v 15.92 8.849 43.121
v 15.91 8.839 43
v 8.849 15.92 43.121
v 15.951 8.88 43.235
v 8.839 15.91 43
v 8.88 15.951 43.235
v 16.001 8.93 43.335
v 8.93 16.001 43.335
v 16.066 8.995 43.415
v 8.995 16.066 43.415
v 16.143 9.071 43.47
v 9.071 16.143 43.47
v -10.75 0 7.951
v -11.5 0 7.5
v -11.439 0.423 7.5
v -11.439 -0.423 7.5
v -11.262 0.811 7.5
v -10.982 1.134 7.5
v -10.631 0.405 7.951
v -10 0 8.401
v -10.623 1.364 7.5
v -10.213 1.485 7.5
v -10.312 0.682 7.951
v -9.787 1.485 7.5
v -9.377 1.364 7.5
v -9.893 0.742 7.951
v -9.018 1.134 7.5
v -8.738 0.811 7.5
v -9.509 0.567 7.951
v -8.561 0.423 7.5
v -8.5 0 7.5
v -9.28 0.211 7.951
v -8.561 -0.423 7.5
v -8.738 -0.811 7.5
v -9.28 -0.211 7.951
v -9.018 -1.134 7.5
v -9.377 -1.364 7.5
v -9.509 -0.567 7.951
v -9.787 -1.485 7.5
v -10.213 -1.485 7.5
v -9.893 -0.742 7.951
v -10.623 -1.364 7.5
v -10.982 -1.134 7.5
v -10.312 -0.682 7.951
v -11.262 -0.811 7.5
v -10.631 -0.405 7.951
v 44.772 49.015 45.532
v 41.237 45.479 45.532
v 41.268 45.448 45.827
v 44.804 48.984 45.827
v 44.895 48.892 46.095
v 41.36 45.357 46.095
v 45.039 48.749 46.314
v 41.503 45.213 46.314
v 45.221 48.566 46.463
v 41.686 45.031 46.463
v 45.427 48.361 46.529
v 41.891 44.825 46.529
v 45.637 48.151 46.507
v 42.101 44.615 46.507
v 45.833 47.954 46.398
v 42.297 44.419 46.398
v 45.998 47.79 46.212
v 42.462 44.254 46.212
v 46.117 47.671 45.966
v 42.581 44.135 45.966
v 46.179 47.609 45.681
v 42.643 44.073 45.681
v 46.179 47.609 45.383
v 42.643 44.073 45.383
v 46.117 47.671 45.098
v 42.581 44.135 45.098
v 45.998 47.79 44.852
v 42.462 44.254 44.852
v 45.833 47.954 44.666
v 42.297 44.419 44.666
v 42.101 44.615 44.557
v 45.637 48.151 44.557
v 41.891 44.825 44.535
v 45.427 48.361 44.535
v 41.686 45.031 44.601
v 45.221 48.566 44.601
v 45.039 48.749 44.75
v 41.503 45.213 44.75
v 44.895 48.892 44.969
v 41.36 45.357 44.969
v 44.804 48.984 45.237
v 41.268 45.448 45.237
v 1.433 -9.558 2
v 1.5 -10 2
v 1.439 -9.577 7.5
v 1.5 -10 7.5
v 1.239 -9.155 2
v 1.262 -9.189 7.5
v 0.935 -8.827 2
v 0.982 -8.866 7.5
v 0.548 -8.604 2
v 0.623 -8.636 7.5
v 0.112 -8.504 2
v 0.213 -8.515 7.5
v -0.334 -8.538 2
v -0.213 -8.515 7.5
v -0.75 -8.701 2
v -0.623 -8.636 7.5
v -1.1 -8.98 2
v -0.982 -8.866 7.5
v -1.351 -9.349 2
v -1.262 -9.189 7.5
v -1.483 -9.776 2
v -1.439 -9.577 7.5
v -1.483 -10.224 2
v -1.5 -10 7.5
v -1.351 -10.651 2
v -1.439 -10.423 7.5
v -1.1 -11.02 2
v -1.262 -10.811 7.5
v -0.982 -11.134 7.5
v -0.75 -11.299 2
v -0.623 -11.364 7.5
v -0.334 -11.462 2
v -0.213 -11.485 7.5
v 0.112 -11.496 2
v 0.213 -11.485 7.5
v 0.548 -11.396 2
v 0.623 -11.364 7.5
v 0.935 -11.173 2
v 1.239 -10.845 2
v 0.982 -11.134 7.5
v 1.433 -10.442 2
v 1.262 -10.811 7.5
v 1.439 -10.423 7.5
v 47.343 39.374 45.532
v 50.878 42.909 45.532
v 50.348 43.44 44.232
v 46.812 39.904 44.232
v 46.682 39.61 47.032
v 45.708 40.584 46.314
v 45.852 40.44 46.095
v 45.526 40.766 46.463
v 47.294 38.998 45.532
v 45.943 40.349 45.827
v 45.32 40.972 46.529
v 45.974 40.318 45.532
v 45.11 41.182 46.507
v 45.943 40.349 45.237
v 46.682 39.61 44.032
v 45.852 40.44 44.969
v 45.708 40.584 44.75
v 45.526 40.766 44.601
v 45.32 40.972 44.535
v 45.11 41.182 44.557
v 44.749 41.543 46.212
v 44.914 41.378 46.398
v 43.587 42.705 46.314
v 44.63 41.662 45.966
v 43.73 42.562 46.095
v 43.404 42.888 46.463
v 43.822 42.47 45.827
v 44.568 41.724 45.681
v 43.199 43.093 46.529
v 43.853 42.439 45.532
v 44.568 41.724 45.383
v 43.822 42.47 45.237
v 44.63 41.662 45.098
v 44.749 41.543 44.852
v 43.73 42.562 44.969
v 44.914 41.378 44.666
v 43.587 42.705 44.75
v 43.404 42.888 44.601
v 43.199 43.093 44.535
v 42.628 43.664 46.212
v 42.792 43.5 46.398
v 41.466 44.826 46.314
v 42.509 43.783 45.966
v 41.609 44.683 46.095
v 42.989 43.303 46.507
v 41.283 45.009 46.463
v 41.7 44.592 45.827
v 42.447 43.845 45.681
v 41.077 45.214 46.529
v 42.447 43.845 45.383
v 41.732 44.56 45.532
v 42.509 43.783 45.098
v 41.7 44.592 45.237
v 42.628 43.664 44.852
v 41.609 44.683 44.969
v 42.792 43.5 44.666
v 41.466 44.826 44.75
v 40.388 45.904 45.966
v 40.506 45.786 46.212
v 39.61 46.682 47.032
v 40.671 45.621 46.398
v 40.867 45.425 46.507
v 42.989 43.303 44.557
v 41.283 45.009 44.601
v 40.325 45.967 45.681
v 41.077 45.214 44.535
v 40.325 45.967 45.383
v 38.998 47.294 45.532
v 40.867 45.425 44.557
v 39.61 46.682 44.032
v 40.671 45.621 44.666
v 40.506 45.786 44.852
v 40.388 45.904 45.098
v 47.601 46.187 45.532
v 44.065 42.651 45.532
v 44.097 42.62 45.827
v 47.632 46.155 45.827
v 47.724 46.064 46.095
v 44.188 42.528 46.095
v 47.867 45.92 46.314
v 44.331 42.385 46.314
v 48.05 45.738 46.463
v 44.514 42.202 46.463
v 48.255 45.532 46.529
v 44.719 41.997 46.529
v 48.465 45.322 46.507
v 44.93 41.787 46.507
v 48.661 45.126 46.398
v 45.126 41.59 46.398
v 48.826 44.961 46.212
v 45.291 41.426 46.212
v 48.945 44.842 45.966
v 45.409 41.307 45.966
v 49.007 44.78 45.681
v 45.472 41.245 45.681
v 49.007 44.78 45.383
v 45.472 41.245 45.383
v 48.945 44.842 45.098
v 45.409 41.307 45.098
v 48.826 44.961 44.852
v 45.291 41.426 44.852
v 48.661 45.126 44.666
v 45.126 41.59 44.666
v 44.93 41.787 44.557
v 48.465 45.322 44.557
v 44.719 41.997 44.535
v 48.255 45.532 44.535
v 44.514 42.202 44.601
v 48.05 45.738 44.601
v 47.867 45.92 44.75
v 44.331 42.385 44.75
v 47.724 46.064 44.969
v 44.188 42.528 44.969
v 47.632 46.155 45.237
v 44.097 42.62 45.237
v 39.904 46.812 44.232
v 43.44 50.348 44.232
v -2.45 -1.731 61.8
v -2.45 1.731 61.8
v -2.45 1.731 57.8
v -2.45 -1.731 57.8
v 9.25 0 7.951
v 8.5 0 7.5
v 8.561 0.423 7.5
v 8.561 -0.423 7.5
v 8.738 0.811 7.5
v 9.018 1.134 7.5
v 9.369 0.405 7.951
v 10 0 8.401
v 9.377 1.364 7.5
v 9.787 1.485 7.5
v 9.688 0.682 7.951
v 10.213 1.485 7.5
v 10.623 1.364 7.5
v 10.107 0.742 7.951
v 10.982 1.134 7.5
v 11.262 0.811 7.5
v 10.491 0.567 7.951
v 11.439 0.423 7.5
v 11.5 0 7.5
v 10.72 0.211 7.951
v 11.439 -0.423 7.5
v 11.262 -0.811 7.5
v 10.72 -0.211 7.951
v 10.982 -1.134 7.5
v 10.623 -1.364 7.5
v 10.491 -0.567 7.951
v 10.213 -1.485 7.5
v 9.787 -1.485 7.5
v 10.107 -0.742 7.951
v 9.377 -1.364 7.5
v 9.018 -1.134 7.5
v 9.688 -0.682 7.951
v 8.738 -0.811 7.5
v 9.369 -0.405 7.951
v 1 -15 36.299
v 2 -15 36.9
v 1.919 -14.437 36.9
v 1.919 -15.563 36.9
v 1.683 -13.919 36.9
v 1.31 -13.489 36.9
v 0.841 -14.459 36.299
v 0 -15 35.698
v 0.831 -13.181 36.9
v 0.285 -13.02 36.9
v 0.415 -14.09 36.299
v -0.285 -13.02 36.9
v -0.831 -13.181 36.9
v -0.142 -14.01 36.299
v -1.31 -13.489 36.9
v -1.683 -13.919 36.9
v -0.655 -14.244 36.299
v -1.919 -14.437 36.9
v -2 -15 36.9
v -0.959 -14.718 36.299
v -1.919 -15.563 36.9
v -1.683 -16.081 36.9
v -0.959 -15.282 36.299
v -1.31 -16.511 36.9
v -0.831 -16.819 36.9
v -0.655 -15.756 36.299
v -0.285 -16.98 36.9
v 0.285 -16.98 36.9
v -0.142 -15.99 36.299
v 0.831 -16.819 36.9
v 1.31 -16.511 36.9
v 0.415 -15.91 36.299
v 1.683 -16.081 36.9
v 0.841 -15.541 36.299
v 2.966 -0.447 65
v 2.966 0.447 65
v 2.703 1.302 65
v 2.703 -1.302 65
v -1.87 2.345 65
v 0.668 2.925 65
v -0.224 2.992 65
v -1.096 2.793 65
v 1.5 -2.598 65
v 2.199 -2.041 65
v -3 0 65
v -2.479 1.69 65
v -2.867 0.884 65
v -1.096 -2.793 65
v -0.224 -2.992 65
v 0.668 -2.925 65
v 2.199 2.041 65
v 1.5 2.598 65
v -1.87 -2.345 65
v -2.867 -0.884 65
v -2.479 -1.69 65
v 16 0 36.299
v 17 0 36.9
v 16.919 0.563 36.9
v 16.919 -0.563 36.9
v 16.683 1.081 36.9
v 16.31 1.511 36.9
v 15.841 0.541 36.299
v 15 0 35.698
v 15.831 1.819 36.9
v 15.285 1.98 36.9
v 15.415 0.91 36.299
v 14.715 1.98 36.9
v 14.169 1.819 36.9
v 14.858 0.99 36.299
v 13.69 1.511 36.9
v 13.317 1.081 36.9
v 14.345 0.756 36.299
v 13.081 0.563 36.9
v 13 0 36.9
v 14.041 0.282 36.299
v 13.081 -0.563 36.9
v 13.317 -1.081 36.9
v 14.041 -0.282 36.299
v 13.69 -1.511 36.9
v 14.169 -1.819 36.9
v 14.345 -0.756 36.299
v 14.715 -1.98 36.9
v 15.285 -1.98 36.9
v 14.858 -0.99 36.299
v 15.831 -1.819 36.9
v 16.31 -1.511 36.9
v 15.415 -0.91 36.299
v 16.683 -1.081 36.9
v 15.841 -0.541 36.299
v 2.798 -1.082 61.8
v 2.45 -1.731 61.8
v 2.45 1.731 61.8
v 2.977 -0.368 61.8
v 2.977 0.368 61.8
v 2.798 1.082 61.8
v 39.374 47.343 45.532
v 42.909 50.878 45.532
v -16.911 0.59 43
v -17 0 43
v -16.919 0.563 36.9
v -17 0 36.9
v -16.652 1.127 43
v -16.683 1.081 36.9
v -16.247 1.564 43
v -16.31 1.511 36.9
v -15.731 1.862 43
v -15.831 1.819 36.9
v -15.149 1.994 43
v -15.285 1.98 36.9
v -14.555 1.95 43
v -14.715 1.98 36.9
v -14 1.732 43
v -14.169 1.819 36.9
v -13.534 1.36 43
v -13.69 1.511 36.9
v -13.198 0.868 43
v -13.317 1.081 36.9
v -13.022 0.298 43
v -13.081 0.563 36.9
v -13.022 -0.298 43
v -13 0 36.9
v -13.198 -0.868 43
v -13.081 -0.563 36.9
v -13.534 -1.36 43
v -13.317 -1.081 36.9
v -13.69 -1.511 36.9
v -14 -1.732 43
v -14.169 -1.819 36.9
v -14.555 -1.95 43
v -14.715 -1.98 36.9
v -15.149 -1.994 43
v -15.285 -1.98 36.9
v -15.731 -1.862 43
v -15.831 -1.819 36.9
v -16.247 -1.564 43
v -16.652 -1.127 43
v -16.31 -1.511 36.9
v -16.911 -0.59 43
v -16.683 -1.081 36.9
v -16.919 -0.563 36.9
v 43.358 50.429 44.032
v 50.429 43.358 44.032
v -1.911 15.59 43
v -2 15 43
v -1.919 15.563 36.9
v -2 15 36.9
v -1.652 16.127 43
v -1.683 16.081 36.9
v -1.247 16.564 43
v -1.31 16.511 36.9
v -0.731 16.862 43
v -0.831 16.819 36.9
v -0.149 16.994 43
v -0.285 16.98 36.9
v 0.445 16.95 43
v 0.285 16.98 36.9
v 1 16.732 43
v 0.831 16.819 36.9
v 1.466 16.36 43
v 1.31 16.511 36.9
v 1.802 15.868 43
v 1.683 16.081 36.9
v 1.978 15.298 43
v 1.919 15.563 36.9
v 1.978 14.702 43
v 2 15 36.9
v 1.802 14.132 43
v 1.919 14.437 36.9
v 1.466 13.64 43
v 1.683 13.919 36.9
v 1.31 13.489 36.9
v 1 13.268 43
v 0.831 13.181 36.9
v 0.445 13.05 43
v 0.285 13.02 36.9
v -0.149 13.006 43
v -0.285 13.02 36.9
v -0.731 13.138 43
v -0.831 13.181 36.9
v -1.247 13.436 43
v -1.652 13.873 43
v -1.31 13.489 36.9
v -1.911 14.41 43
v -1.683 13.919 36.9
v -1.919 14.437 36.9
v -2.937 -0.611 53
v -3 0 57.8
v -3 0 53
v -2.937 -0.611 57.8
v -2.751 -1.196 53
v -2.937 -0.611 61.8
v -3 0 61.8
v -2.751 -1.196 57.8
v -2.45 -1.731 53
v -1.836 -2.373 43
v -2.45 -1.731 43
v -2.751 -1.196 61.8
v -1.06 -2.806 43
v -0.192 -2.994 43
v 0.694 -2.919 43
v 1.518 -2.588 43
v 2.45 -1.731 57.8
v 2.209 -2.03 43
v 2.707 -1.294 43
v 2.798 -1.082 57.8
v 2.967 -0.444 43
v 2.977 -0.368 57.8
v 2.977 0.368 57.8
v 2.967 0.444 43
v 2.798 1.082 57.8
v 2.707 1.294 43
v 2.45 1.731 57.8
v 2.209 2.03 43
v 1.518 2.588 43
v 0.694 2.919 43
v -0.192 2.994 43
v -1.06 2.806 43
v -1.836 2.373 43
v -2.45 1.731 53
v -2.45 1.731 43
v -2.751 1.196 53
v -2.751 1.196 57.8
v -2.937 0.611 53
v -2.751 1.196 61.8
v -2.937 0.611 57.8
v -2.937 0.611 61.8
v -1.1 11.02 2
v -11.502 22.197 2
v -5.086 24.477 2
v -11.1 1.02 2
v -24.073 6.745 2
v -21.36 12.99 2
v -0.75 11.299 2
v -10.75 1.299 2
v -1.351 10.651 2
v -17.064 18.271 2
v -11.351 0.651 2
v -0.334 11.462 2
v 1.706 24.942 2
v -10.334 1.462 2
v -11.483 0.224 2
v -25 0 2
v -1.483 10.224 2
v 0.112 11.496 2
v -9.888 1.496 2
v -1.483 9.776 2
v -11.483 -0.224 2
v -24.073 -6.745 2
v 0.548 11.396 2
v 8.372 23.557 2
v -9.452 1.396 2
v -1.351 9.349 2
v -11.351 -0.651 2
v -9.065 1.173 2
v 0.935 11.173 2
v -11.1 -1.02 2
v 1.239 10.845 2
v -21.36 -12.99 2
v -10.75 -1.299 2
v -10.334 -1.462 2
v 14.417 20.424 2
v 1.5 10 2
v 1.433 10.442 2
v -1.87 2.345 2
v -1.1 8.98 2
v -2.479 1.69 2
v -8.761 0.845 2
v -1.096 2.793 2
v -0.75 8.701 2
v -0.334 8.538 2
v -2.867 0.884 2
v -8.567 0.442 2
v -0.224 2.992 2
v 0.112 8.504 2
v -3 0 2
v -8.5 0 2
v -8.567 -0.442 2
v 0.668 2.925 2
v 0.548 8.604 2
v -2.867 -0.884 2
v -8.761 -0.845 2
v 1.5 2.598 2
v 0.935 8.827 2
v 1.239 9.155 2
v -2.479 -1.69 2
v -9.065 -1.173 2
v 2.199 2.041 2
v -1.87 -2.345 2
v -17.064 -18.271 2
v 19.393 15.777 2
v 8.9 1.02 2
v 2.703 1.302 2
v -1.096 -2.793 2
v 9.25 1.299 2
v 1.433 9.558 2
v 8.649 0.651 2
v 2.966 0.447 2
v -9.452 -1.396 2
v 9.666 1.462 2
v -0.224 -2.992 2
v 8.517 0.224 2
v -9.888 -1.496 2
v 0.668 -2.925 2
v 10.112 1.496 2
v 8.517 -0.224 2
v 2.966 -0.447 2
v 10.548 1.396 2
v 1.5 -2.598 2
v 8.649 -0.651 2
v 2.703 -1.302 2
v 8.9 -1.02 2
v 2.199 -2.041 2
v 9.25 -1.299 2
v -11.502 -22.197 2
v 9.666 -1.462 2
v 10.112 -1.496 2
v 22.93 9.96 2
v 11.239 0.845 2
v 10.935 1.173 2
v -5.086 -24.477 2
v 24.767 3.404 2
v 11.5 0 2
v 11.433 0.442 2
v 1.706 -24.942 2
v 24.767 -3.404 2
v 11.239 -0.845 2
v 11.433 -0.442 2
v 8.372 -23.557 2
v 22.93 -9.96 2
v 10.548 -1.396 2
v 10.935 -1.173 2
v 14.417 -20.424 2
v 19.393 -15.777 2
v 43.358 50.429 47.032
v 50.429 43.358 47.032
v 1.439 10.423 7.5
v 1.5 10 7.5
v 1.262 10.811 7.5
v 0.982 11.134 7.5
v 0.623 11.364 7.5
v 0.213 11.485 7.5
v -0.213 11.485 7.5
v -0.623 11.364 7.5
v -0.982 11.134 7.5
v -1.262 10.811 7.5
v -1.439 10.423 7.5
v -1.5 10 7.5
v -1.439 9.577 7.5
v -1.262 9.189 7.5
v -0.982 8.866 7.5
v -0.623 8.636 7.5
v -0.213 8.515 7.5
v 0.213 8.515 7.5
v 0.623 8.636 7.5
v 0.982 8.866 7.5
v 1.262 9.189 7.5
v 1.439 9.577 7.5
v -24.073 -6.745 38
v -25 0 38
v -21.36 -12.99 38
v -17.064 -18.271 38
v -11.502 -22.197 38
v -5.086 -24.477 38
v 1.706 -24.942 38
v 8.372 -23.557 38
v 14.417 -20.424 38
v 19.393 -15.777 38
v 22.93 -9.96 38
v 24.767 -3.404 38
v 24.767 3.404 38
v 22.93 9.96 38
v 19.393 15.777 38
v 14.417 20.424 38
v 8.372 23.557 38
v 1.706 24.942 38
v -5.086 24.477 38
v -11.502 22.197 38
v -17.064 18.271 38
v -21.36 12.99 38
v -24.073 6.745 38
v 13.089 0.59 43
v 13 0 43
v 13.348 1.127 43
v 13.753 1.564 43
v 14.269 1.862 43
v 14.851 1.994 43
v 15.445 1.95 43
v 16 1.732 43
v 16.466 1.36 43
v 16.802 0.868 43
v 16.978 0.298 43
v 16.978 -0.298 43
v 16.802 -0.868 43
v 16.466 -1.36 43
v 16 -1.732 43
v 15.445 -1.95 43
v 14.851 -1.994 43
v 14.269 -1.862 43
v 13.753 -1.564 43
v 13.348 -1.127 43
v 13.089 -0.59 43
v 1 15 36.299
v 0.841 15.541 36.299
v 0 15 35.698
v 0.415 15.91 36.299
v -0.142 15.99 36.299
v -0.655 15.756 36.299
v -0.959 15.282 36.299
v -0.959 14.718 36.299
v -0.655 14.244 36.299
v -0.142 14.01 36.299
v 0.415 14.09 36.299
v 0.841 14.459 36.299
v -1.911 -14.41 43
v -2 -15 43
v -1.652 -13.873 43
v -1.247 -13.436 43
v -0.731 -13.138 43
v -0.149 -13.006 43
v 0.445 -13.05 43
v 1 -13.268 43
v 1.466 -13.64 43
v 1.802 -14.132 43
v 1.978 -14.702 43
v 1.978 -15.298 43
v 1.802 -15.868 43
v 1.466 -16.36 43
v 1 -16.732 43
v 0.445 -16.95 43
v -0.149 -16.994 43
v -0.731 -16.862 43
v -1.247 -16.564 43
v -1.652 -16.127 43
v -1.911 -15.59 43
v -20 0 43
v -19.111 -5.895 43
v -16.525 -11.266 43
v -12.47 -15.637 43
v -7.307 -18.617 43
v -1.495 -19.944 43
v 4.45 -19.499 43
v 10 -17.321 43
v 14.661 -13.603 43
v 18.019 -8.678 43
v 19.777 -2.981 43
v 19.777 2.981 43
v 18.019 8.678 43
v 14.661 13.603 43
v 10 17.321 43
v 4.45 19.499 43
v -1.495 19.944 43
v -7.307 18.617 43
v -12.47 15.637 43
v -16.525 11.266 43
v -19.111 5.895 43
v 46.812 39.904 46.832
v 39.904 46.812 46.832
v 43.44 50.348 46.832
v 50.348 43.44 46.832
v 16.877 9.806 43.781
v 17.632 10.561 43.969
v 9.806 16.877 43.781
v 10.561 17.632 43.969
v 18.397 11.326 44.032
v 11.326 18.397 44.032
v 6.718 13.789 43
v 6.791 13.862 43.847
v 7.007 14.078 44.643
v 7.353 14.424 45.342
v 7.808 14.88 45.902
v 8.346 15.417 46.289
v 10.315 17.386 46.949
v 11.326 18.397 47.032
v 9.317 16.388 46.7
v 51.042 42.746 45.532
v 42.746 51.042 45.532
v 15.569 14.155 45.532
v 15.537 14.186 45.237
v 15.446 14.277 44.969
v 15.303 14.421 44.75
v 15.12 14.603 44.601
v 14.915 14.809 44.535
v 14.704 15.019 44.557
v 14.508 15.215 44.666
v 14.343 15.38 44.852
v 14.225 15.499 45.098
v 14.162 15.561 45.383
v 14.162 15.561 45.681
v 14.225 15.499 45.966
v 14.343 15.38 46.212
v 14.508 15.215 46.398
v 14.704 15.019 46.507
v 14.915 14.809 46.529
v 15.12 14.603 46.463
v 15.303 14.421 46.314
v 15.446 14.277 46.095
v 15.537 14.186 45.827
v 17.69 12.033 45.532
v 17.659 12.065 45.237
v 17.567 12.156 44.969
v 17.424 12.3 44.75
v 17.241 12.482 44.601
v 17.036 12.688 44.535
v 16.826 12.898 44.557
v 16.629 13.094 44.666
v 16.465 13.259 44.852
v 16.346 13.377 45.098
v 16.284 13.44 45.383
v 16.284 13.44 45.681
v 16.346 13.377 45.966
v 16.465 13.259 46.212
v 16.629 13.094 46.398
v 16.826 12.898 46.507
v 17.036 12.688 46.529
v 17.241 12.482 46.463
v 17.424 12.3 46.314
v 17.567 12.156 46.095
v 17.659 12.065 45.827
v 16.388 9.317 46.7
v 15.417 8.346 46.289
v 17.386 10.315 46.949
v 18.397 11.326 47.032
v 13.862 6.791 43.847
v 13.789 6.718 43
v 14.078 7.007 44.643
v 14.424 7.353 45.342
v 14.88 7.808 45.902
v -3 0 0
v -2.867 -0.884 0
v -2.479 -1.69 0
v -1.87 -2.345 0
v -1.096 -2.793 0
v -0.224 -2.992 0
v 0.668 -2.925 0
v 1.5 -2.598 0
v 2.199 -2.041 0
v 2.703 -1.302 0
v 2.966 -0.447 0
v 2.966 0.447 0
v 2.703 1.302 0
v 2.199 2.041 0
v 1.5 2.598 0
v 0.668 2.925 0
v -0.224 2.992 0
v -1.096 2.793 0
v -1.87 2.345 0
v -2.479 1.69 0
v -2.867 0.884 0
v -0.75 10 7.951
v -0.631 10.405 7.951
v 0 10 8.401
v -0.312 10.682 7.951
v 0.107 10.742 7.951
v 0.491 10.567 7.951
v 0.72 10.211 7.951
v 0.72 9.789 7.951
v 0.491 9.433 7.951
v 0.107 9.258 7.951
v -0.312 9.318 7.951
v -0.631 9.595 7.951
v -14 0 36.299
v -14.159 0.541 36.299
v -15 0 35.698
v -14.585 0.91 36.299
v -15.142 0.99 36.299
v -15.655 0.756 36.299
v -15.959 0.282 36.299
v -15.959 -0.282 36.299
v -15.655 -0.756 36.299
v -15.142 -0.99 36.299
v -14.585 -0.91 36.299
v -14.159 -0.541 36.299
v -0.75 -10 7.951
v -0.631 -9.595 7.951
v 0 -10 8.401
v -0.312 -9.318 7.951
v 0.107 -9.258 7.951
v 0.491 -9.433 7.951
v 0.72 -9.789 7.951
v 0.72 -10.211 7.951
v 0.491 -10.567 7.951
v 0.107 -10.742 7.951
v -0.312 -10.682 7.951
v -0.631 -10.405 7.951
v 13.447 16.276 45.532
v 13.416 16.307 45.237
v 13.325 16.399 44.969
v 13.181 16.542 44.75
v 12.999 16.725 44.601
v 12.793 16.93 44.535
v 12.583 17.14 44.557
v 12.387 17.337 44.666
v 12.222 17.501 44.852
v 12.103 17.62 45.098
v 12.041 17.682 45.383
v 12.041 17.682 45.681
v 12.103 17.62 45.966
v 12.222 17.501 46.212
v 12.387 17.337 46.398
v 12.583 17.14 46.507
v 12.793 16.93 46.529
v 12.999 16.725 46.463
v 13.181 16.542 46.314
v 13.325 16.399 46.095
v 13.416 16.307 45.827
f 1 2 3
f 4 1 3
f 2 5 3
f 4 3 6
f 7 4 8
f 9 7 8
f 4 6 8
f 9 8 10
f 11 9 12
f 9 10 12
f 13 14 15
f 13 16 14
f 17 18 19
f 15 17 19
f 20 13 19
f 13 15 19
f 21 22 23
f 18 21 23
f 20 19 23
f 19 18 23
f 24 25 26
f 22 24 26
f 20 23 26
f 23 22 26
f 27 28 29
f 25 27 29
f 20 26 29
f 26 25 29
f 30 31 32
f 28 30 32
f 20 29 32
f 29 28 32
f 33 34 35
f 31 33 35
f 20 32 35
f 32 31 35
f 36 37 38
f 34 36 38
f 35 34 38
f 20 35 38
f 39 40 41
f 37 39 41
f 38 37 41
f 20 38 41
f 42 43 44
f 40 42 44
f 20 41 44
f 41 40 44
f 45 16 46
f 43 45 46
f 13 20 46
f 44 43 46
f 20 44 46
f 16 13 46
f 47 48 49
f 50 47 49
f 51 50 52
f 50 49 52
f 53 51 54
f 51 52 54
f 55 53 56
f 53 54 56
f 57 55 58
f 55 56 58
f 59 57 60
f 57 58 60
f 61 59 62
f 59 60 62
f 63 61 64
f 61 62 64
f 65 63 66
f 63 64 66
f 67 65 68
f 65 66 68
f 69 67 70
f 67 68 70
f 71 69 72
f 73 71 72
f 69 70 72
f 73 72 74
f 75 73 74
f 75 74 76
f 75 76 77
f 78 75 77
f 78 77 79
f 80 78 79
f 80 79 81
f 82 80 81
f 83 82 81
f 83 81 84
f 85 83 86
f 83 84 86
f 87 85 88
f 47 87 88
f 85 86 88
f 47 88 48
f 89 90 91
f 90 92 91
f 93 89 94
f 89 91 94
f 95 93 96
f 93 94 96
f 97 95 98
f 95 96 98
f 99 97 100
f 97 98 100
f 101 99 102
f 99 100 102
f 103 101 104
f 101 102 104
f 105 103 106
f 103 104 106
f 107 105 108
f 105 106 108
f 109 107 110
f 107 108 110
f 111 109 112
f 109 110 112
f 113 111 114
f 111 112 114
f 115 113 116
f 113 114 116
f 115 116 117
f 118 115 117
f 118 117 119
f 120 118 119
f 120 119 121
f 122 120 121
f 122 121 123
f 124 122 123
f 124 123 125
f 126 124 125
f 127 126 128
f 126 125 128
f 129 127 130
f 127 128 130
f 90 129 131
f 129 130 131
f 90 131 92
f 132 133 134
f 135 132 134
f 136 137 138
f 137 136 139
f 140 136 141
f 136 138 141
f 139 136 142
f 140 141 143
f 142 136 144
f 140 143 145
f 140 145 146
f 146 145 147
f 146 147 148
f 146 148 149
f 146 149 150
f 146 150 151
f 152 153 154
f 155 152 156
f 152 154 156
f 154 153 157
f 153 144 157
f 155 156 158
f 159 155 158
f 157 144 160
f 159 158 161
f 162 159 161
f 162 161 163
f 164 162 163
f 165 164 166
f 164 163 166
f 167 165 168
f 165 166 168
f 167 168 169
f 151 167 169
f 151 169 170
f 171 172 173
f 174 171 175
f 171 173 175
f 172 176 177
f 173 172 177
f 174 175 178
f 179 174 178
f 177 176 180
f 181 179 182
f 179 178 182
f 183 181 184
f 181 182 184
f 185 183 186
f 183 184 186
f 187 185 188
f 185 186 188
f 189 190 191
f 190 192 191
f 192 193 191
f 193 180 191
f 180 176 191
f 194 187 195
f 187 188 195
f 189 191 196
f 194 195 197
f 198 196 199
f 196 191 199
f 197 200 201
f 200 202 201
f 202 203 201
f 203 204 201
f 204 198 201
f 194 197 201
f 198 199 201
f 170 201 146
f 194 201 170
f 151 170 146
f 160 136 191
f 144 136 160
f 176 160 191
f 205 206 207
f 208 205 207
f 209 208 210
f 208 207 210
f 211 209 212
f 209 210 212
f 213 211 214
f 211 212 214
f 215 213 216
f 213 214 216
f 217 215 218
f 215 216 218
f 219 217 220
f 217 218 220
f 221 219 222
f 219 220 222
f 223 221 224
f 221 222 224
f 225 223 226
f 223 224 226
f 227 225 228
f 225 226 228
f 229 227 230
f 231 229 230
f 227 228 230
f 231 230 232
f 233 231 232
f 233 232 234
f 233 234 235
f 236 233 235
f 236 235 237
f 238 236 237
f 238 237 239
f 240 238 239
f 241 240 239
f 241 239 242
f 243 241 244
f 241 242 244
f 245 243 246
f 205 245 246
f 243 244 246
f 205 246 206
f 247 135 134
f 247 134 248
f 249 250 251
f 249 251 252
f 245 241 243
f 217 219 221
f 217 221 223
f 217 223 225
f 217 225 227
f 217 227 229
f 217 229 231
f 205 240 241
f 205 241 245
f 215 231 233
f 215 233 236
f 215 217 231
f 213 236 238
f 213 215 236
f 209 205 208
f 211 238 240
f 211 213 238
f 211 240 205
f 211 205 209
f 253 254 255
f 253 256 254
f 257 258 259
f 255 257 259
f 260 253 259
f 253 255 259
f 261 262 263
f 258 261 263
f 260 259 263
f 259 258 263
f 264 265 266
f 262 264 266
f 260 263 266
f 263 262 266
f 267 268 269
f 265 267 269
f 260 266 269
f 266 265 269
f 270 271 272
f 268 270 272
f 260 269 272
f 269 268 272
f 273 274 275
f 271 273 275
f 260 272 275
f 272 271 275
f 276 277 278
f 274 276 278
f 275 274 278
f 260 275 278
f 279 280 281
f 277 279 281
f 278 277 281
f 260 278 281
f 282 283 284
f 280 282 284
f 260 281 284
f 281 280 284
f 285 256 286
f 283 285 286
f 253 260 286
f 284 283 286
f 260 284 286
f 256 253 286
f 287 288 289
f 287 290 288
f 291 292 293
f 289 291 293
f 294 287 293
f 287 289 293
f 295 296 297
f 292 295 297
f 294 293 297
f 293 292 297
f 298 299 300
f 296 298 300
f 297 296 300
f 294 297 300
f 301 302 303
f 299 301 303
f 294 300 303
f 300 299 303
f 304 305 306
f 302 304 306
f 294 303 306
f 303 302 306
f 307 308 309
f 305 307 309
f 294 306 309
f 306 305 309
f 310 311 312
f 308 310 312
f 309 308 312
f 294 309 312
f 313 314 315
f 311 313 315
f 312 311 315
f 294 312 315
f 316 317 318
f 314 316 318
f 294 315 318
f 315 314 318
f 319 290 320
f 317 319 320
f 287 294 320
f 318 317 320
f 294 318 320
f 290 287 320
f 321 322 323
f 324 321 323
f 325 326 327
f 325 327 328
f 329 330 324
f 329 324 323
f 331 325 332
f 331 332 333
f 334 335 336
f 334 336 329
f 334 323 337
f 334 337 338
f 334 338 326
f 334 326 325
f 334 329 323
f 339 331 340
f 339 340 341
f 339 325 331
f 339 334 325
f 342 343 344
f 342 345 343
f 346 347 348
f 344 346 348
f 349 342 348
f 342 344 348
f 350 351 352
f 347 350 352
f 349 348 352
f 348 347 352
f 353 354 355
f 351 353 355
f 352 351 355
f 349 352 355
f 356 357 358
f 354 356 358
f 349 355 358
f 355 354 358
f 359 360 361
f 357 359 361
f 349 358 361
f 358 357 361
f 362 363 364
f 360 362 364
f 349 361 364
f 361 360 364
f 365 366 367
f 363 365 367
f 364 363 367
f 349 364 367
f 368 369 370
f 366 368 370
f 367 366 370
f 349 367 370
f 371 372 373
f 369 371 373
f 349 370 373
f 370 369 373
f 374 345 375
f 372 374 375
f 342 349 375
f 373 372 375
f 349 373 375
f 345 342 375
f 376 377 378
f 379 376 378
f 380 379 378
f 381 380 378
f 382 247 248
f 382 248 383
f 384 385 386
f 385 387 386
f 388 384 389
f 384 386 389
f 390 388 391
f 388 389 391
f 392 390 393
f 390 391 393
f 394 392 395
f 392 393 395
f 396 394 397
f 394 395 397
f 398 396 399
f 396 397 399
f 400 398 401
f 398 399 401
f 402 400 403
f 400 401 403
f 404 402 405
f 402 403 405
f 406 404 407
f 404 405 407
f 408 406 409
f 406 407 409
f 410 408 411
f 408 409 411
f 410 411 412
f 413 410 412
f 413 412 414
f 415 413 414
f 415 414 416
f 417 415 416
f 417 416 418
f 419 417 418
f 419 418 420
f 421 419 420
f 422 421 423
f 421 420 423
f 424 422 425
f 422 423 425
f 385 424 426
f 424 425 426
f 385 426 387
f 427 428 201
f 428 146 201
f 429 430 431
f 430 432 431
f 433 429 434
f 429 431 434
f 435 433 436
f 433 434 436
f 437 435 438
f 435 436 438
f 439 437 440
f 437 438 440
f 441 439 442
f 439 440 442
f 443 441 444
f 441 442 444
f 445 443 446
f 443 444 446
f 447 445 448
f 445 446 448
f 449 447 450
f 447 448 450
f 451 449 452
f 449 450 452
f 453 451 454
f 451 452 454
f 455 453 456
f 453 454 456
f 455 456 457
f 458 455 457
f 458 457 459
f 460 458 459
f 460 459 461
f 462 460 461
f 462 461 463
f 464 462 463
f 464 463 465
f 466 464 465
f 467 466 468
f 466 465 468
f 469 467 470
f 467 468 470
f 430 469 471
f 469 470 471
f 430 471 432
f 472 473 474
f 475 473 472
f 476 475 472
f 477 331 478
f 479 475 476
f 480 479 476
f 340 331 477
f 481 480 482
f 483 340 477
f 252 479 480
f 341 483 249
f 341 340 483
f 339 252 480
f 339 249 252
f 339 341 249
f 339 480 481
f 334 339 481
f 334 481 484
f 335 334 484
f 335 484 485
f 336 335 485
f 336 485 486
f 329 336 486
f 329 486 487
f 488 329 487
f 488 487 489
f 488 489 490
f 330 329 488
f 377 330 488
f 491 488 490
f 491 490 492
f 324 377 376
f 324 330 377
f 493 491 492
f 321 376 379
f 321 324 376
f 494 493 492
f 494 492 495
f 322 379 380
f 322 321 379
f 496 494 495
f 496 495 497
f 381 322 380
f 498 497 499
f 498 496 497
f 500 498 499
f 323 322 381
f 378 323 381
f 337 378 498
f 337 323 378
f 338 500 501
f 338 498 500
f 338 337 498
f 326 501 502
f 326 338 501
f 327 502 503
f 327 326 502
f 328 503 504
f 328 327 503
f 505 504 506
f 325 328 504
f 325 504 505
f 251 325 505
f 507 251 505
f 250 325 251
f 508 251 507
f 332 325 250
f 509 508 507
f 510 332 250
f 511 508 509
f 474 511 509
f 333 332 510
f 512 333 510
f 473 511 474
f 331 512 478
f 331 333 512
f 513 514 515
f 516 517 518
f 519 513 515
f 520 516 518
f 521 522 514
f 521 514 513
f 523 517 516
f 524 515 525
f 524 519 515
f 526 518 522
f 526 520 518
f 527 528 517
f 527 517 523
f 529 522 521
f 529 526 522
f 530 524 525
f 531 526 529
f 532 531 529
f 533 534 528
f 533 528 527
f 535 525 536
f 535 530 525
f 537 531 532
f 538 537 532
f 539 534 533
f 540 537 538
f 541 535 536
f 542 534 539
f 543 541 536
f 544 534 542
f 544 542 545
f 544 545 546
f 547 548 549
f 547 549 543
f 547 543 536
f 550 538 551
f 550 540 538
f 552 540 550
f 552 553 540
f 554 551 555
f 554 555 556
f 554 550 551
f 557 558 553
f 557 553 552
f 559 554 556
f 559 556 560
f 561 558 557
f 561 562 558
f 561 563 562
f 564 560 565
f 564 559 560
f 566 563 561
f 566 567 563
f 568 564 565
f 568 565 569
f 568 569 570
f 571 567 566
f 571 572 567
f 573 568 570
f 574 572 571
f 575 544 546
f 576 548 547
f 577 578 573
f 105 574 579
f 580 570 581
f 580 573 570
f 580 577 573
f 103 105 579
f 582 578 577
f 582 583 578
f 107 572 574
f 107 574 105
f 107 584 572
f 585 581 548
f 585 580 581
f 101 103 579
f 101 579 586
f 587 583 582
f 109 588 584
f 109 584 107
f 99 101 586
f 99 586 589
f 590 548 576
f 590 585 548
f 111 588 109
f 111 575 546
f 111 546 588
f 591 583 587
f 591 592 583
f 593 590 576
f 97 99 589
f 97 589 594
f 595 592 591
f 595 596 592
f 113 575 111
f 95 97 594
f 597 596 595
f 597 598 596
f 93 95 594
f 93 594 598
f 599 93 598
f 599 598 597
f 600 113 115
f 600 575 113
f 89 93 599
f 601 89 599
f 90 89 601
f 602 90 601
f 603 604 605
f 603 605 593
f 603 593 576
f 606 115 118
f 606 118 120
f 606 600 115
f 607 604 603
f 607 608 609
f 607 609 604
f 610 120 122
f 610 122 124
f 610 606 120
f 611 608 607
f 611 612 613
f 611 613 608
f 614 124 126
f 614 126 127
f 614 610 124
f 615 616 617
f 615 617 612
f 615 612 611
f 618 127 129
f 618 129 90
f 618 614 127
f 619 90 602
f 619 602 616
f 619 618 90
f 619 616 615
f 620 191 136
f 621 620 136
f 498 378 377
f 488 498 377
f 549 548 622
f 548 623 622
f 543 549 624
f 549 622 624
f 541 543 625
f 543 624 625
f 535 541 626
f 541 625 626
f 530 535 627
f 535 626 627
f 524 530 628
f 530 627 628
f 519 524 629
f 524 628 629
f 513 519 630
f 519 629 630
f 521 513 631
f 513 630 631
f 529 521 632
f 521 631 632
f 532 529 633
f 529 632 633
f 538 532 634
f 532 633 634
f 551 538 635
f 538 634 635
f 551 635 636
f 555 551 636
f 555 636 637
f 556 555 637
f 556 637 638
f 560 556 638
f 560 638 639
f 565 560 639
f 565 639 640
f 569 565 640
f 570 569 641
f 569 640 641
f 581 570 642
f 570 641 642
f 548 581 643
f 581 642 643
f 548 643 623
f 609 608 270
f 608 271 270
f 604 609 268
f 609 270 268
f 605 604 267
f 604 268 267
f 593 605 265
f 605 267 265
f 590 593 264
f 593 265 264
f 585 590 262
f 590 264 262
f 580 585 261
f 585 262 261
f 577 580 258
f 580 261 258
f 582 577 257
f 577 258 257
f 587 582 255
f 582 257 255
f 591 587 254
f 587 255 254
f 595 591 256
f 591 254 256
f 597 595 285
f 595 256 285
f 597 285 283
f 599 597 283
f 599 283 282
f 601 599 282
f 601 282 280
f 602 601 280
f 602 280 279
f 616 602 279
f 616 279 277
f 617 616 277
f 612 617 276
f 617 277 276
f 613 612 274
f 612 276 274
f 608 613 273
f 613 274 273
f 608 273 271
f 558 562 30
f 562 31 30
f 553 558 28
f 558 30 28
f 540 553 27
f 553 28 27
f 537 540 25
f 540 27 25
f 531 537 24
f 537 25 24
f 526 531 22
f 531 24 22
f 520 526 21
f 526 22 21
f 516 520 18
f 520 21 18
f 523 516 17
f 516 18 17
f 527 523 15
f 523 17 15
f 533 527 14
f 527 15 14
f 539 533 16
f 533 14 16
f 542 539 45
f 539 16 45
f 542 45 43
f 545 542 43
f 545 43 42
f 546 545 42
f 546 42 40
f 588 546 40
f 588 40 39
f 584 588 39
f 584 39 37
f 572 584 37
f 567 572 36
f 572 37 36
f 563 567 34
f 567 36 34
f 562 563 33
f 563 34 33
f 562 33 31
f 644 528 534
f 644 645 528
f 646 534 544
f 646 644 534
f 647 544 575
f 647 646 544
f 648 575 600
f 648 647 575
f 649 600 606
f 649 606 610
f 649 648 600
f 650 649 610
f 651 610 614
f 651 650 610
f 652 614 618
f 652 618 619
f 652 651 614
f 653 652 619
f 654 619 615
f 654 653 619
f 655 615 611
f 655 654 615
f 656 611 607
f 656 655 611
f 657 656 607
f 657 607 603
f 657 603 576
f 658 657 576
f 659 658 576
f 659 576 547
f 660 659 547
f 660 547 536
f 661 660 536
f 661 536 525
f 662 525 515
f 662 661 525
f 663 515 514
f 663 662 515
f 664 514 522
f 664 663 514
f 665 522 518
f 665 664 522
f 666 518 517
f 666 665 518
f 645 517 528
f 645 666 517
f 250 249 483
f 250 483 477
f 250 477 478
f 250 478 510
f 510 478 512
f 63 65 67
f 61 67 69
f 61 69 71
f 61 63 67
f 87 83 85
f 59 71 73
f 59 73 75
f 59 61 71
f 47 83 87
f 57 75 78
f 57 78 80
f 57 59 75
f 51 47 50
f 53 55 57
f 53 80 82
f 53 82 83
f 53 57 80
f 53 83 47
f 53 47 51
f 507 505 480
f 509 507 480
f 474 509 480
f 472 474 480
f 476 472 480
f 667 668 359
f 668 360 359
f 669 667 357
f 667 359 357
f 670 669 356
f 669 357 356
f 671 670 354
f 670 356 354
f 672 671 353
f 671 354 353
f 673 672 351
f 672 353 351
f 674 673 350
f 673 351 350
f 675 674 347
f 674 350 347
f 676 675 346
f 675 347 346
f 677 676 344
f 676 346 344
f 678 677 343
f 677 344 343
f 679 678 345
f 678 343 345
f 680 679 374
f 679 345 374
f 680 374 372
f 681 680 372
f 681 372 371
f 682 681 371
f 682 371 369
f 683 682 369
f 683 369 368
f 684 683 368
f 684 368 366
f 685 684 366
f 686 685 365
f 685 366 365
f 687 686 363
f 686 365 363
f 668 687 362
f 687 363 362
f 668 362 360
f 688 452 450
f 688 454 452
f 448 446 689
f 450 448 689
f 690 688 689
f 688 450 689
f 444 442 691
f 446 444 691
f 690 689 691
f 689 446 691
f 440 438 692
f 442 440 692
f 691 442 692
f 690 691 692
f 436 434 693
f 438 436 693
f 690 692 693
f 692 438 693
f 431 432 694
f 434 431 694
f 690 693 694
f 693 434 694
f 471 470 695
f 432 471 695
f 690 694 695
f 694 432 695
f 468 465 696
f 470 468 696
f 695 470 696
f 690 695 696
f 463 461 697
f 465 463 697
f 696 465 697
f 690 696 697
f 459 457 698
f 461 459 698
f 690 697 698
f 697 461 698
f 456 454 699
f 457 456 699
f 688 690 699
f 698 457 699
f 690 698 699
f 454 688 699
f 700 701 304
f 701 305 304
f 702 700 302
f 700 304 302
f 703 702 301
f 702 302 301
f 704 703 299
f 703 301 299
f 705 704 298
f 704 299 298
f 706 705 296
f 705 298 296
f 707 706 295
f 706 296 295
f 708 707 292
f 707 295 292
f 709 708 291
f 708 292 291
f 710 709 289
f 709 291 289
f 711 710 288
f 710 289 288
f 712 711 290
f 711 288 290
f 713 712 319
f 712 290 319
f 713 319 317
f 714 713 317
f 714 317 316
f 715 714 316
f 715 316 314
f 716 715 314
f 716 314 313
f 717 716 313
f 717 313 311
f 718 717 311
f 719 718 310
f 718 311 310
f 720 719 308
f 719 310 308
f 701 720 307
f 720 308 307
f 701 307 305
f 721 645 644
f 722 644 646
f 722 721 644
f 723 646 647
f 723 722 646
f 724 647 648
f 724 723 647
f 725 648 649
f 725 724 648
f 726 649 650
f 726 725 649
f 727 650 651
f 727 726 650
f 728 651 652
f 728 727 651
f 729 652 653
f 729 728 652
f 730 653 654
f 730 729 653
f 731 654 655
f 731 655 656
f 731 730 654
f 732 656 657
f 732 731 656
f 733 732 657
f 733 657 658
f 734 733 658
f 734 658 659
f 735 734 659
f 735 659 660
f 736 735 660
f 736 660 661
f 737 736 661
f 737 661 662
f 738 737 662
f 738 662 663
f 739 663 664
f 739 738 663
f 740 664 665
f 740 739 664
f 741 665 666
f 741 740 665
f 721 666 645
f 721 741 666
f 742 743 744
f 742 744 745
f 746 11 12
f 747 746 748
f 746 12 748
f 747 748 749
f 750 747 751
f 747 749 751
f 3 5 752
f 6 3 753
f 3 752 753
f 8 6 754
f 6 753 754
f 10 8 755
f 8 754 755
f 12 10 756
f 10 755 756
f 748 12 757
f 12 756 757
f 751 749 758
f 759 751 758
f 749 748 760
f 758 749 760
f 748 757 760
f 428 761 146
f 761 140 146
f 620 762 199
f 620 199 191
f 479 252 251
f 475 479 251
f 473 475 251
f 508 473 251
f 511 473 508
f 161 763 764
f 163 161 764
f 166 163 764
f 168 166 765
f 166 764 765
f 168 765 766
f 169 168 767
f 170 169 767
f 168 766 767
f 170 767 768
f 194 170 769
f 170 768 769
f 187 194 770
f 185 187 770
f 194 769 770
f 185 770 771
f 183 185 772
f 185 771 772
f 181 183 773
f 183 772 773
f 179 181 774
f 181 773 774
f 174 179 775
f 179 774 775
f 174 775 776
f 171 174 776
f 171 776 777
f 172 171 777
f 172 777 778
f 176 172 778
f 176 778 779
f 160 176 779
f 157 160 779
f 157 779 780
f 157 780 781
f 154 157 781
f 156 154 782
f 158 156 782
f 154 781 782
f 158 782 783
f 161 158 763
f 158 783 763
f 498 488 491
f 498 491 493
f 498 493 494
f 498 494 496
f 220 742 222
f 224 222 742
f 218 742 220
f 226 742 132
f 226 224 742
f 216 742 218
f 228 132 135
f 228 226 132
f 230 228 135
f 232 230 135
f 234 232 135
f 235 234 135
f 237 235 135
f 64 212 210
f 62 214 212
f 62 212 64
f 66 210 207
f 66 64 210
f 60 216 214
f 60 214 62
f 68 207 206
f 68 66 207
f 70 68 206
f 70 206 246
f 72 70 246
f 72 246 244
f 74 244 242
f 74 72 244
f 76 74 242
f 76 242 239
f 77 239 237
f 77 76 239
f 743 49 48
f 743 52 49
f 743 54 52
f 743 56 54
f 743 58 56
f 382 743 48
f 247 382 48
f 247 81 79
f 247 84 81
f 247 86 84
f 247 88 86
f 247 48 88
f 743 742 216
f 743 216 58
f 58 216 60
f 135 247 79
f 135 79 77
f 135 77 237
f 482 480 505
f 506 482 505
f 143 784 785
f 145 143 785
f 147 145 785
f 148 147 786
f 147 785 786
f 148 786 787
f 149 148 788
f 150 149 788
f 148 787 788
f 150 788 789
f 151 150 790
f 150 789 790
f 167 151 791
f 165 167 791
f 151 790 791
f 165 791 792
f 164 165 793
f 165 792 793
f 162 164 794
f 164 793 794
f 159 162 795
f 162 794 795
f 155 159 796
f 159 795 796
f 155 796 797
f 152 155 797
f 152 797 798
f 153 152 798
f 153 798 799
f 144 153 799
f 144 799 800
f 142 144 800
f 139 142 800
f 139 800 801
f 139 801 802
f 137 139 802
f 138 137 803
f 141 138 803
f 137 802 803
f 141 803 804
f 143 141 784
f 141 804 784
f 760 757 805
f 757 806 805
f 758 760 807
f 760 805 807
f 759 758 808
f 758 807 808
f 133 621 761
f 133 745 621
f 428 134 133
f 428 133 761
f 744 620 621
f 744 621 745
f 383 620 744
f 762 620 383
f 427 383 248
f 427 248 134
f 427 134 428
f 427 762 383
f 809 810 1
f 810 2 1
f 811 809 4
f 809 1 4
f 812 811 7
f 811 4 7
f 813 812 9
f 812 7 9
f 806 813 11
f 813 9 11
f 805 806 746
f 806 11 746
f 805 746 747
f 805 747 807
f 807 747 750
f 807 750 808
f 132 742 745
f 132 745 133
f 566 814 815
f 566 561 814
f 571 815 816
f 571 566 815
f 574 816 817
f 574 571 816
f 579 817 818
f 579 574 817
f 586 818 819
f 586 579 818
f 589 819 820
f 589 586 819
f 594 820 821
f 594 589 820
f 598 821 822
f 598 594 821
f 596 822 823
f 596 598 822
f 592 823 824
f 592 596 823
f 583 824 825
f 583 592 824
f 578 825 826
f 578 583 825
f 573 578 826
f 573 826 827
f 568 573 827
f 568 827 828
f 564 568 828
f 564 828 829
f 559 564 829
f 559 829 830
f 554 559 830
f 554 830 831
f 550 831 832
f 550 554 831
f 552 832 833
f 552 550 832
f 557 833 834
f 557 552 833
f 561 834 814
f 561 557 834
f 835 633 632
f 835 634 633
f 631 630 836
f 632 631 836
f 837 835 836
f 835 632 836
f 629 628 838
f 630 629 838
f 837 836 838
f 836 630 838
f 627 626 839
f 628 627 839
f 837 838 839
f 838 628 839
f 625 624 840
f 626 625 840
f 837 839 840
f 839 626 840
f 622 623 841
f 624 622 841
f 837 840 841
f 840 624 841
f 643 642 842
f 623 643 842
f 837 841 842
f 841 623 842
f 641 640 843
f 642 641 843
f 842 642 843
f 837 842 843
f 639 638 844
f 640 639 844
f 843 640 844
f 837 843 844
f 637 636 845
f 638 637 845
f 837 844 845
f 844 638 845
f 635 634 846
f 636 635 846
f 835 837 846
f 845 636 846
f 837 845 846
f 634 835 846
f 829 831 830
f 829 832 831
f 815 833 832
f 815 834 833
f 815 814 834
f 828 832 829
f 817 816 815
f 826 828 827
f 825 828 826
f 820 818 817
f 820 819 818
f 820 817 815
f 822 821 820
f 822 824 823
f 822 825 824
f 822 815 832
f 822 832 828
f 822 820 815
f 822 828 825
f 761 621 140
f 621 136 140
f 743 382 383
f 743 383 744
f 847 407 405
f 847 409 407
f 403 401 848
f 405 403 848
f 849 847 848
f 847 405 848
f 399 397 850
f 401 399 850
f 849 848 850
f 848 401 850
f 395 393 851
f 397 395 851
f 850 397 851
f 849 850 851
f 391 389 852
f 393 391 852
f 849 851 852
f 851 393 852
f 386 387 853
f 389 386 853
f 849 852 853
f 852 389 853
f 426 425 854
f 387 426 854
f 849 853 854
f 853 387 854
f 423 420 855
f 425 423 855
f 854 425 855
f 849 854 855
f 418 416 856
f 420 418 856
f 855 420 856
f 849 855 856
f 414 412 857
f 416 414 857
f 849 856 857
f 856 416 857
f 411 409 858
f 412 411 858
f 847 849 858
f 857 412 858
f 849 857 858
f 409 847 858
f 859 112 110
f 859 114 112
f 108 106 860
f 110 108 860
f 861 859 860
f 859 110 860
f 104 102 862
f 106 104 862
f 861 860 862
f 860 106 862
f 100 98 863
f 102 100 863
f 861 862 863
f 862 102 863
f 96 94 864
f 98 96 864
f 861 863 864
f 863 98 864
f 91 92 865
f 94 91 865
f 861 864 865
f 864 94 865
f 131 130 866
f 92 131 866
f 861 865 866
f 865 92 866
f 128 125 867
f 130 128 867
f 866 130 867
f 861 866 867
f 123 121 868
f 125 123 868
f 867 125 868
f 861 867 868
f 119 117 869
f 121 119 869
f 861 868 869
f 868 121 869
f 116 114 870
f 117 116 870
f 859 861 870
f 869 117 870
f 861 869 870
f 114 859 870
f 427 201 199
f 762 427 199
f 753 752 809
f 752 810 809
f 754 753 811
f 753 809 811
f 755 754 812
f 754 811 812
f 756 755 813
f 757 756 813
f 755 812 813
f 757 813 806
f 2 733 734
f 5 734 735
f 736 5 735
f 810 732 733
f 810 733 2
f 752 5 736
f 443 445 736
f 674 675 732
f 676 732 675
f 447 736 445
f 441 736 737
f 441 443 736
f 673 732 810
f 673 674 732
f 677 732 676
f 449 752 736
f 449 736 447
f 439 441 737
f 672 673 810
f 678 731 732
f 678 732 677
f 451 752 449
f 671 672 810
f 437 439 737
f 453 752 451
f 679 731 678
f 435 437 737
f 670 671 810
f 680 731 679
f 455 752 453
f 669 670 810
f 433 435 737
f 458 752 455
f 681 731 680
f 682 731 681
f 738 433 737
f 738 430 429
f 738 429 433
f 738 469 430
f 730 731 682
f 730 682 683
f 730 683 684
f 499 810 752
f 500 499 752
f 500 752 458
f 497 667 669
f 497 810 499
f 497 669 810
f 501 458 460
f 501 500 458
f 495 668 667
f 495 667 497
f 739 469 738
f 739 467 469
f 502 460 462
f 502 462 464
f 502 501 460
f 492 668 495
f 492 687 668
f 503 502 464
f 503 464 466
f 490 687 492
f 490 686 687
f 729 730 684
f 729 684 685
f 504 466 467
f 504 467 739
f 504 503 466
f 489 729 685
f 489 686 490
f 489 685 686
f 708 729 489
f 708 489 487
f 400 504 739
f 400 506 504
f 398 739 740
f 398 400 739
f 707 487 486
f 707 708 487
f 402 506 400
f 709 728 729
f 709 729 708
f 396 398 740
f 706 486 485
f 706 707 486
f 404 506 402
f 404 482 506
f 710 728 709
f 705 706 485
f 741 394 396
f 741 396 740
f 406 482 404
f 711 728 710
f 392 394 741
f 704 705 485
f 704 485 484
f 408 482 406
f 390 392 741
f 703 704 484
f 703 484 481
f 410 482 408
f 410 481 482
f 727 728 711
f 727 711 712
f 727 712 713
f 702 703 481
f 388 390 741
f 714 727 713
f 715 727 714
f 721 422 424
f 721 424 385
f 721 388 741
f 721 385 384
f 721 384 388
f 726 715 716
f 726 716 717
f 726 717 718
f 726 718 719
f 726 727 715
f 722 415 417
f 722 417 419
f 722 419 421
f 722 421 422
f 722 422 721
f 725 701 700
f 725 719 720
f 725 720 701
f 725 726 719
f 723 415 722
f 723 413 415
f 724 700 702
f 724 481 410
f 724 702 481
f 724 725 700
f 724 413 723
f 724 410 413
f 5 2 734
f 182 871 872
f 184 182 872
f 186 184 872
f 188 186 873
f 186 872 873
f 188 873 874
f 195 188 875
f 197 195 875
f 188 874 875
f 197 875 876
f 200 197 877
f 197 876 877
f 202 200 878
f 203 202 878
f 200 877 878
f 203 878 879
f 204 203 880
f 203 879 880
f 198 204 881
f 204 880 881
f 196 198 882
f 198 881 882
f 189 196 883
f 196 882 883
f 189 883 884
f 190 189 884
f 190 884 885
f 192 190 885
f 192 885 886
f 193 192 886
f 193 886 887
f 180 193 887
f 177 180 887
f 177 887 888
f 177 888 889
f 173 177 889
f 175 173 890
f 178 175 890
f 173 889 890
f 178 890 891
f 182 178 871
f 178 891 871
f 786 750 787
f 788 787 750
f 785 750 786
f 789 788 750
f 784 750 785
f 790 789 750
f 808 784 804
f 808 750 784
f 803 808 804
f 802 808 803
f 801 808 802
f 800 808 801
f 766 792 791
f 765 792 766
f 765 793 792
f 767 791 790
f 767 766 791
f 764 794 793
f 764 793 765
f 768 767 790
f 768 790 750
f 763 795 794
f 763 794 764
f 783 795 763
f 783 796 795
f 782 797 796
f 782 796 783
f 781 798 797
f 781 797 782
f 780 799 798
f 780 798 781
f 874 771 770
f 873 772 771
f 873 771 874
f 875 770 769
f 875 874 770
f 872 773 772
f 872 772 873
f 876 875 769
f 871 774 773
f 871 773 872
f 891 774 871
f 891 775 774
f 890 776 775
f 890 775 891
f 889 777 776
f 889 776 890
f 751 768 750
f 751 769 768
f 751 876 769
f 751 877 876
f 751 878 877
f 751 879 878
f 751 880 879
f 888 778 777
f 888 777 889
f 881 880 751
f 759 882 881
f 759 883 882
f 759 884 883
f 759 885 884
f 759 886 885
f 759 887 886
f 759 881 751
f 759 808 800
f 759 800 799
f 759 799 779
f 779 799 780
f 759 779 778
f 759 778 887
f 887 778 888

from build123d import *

# Parameters (mm, degrees)
HOLE_WIZARD_M4_1_D     = 4
HOLE_WIZARD_M4_1_DEPTH = 6.1
HOLE_WIZARD_M4_1_TIP   = 1.201721238
HOLE_WIZARD_M3_1_D     = 3
HOLE_WIZARD_M3_1_DEPTH = 5.5
HOLE_WIZARD_M3_1_TIP   = 0.901290929
SKETCH_11_R            = 1
EXTRUDE_1_DEPTH        = 40
EXTRUDE_2_DEPTH        = 0.3
SKETCH_13_R            = 1
EXTRUDE_3_DEPTH        = 5
CUT_EXTRUDE_1_DEPTH    = 4
CUT_EXTRUDE_2_DEPTH    = 10


with BuildPart() as part:
    # 草图1 → 旋转1 (revolve)
    with BuildSketch(Plane(origin=(0, 0, 0), x_dir=(0, 0, -1), z_dir=(1, 0, 0)), mode=Mode.PRIVATE) as revolve_1_sk:
        Polygon((-2, 25), (-38, 25), (-43, 20), (-43, 3), (-65, 3), (-65, 0), (0, 0), (0, 3), (-2, 3), align=None)
    revolve(revolve_1_sk.sketch.rotate(Axis((0, 0, 0), (0, 0, 1)), 90), axis=Axis((0, 0, 0), (0, 0, 1)))

    # M4 螺纹孔1
    with Locations(Plane.XY.offset(43)):
        with Locations((0, 15), (15, 0), (0, -15), (-15, 0)):
            Hole(HOLE_WIZARD_M4_1_D / 2, depth=HOLE_WIZARD_M4_1_DEPTH)
            with Locations((0, 0, -(HOLE_WIZARD_M4_1_DEPTH + HOLE_WIZARD_M4_1_TIP / 2))):  # 118° drill point
                Cone(0, HOLE_WIZARD_M4_1_D / 2, HOLE_WIZARD_M4_1_TIP, mode=Mode.SUBTRACT)

    # M3 螺纹孔1
    with Locations(Plane(origin=(0, 0, 2), x_dir=(-1, 0, 0), z_dir=(0, 0, -1))):
        with Locations((0, 10), (10, 0), (0, -10), (-10, 0)):
            Hole(HOLE_WIZARD_M3_1_D / 2, depth=HOLE_WIZARD_M3_1_DEPTH)
            with Locations((0, 0, -(HOLE_WIZARD_M3_1_DEPTH + HOLE_WIZARD_M3_1_TIP / 2))):  # 118° drill point
                Cone(0, HOLE_WIZARD_M3_1_D / 2, HOLE_WIZARD_M3_1_TIP, mode=Mode.SUBTRACT)

    # 扫描1: sweep along a path in 草图9
    with BuildLine(Plane(origin=(0, 0, 0), x_dir=(0.7071067811865477, 0.7071067811865475, 0), z_dir=(-0.7071067811865475, 0.7071067811865477, 0))) as sweep_1_path:
        ThreePointArc((16, -43), (16.361695911, -44.147152873), (17.315959713, -44.879385242))
        ThreePointArc((17.315959713, -44.879385242), (19.138240785, -45.367663983), (21.017626027, -45.532088886))
    # 草图8 → 扫描1 (sweep)
    with BuildSketch(Plane.XY.offset(43)):
        Polygon((6.717514421, 13.788582233), (13.788582233, 6.717514421), (15.909902577, 8.838834765), (8.838834765, 15.909902577), align=None)
    sweep(path=sweep_1_path.line)

    # 草图11 → 凸台-拉伸1 (add)
    with BuildSketch(Plane(origin=(14.861705888, 14.861705888, 0), x_dir=(0, 0, -1), z_dir=(0.7071067811865476, 0.7071067811865476, 0))):
        with Locations(Location((-45.532088886, 0, 0), (0, 0, 270))):
            Circle(SKETCH_11_R)
        with Locations(Location((-45.532088886, 3, 0), (0, 0, 270))):
            Circle(SKETCH_11_R)
        with Locations(Location((-45.532088886, -3, 0), (0, 0, 270))):
            Circle(SKETCH_11_R)
    extrude(amount=EXTRUDE_1_DEPTH)

    # 草图12 → 凸台-拉伸2 (add)
    with BuildSketch(Plane(origin=(43.145977136, 43.145977136, 0), x_dir=(0, 0, -1), z_dir=(0.7071067811865477, 0.7071067811865475, 0))):
        Polygon((-47.032088886, -5), (-45.532088886, -5.866025404), (-44.032088886, -5), (-44.032088886, 5), (-45.532088886, 5.866025404), (-47.032088886, 5), align=None)
    extrude(amount=EXTRUDE_2_DEPTH)

    # 草图13 → 凸台-拉伸3 (add)
    # profile 1 of 3: a face of its own
    with BuildSketch(Plane(origin=(43.35810917, 43.35810917, 0), x_dir=(0, 0, -1), z_dir=(0.7071067811865477, 0.7071067811865475, -3.269036566852065e-15))):
        Polygon((-47.032088886, 5), (-47.032088886, -5), (-45.532088886, -5.866025404), (-44.032088886, -5), (-44.032088886, 5), (-45.532088886, 5.866025404), align=None)
        Polygon((-46.832088886, 4.884529946), (-46.832088886, -4.884529946), (-45.532088886, -5.635085296), (-44.232088886, -4.884529946), (-44.232088886, 4.884529946), (-45.532088886, 5.635085296), align=None, mode=Mode.SUBTRACT)
    # profile 2 of 3: a face of its own
    with BuildSketch(Plane(origin=(43.35810917, 43.35810917, 0), x_dir=(0, 0, -1), z_dir=(0.7071067811865477, 0.7071067811865475, -3.269036566852065e-15))):
        with Locations(Location((-45.532088886, 2, 0), (0, 0, 90))):
            Circle(SKETCH_13_R)
    # profile 3 of 3: a face of its own
    with BuildSketch(Plane(origin=(43.35810917, 43.35810917, 0), x_dir=(0, 0, -1), z_dir=(0.7071067811865477, 0.7071067811865475, -3.269036566852065e-15))):
        with Locations(Location((-45.532088886, -2, 0), (0, 0, 90))):
            Circle(SKETCH_13_R)
    extrude(amount=EXTRUDE_3_DEPTH)

    # 草图14 → 切除-拉伸1 (cut)
    with BuildSketch(Plane.XY.offset(61.8)):
        with BuildLine():
            Line((-2.45, 1.731328969), (-2.45, -1.731328969))
            ThreePointArc((-2.45, -1.731328969), (-3, 0), (-2.45, 1.731328969))
        make_face()
        with BuildLine():
            Line((2.45, 1.731328969), (2.45, -1.731328969))
            ThreePointArc((2.45, -1.731328969), (3, 0), (2.45, 1.731328969))
        make_face()
    extrude(amount=-CUT_EXTRUDE_1_DEPTH, mode=Mode.SUBTRACT)

    # 草图15 → 切除-拉伸2 (cut)
    with BuildSketch(Plane.XY.offset(53)):
        with BuildLine():
            Line((-2.45, -1.731328969), (-2.45, 1.731328969))
            ThreePointArc((-2.45, 1.731328969), (-3, 0), (-2.45, -1.731328969))
        make_face()
    extrude(amount=-CUT_EXTRUDE_2_DEPTH, mode=Mode.SUBTRACT)


solid = part.part
